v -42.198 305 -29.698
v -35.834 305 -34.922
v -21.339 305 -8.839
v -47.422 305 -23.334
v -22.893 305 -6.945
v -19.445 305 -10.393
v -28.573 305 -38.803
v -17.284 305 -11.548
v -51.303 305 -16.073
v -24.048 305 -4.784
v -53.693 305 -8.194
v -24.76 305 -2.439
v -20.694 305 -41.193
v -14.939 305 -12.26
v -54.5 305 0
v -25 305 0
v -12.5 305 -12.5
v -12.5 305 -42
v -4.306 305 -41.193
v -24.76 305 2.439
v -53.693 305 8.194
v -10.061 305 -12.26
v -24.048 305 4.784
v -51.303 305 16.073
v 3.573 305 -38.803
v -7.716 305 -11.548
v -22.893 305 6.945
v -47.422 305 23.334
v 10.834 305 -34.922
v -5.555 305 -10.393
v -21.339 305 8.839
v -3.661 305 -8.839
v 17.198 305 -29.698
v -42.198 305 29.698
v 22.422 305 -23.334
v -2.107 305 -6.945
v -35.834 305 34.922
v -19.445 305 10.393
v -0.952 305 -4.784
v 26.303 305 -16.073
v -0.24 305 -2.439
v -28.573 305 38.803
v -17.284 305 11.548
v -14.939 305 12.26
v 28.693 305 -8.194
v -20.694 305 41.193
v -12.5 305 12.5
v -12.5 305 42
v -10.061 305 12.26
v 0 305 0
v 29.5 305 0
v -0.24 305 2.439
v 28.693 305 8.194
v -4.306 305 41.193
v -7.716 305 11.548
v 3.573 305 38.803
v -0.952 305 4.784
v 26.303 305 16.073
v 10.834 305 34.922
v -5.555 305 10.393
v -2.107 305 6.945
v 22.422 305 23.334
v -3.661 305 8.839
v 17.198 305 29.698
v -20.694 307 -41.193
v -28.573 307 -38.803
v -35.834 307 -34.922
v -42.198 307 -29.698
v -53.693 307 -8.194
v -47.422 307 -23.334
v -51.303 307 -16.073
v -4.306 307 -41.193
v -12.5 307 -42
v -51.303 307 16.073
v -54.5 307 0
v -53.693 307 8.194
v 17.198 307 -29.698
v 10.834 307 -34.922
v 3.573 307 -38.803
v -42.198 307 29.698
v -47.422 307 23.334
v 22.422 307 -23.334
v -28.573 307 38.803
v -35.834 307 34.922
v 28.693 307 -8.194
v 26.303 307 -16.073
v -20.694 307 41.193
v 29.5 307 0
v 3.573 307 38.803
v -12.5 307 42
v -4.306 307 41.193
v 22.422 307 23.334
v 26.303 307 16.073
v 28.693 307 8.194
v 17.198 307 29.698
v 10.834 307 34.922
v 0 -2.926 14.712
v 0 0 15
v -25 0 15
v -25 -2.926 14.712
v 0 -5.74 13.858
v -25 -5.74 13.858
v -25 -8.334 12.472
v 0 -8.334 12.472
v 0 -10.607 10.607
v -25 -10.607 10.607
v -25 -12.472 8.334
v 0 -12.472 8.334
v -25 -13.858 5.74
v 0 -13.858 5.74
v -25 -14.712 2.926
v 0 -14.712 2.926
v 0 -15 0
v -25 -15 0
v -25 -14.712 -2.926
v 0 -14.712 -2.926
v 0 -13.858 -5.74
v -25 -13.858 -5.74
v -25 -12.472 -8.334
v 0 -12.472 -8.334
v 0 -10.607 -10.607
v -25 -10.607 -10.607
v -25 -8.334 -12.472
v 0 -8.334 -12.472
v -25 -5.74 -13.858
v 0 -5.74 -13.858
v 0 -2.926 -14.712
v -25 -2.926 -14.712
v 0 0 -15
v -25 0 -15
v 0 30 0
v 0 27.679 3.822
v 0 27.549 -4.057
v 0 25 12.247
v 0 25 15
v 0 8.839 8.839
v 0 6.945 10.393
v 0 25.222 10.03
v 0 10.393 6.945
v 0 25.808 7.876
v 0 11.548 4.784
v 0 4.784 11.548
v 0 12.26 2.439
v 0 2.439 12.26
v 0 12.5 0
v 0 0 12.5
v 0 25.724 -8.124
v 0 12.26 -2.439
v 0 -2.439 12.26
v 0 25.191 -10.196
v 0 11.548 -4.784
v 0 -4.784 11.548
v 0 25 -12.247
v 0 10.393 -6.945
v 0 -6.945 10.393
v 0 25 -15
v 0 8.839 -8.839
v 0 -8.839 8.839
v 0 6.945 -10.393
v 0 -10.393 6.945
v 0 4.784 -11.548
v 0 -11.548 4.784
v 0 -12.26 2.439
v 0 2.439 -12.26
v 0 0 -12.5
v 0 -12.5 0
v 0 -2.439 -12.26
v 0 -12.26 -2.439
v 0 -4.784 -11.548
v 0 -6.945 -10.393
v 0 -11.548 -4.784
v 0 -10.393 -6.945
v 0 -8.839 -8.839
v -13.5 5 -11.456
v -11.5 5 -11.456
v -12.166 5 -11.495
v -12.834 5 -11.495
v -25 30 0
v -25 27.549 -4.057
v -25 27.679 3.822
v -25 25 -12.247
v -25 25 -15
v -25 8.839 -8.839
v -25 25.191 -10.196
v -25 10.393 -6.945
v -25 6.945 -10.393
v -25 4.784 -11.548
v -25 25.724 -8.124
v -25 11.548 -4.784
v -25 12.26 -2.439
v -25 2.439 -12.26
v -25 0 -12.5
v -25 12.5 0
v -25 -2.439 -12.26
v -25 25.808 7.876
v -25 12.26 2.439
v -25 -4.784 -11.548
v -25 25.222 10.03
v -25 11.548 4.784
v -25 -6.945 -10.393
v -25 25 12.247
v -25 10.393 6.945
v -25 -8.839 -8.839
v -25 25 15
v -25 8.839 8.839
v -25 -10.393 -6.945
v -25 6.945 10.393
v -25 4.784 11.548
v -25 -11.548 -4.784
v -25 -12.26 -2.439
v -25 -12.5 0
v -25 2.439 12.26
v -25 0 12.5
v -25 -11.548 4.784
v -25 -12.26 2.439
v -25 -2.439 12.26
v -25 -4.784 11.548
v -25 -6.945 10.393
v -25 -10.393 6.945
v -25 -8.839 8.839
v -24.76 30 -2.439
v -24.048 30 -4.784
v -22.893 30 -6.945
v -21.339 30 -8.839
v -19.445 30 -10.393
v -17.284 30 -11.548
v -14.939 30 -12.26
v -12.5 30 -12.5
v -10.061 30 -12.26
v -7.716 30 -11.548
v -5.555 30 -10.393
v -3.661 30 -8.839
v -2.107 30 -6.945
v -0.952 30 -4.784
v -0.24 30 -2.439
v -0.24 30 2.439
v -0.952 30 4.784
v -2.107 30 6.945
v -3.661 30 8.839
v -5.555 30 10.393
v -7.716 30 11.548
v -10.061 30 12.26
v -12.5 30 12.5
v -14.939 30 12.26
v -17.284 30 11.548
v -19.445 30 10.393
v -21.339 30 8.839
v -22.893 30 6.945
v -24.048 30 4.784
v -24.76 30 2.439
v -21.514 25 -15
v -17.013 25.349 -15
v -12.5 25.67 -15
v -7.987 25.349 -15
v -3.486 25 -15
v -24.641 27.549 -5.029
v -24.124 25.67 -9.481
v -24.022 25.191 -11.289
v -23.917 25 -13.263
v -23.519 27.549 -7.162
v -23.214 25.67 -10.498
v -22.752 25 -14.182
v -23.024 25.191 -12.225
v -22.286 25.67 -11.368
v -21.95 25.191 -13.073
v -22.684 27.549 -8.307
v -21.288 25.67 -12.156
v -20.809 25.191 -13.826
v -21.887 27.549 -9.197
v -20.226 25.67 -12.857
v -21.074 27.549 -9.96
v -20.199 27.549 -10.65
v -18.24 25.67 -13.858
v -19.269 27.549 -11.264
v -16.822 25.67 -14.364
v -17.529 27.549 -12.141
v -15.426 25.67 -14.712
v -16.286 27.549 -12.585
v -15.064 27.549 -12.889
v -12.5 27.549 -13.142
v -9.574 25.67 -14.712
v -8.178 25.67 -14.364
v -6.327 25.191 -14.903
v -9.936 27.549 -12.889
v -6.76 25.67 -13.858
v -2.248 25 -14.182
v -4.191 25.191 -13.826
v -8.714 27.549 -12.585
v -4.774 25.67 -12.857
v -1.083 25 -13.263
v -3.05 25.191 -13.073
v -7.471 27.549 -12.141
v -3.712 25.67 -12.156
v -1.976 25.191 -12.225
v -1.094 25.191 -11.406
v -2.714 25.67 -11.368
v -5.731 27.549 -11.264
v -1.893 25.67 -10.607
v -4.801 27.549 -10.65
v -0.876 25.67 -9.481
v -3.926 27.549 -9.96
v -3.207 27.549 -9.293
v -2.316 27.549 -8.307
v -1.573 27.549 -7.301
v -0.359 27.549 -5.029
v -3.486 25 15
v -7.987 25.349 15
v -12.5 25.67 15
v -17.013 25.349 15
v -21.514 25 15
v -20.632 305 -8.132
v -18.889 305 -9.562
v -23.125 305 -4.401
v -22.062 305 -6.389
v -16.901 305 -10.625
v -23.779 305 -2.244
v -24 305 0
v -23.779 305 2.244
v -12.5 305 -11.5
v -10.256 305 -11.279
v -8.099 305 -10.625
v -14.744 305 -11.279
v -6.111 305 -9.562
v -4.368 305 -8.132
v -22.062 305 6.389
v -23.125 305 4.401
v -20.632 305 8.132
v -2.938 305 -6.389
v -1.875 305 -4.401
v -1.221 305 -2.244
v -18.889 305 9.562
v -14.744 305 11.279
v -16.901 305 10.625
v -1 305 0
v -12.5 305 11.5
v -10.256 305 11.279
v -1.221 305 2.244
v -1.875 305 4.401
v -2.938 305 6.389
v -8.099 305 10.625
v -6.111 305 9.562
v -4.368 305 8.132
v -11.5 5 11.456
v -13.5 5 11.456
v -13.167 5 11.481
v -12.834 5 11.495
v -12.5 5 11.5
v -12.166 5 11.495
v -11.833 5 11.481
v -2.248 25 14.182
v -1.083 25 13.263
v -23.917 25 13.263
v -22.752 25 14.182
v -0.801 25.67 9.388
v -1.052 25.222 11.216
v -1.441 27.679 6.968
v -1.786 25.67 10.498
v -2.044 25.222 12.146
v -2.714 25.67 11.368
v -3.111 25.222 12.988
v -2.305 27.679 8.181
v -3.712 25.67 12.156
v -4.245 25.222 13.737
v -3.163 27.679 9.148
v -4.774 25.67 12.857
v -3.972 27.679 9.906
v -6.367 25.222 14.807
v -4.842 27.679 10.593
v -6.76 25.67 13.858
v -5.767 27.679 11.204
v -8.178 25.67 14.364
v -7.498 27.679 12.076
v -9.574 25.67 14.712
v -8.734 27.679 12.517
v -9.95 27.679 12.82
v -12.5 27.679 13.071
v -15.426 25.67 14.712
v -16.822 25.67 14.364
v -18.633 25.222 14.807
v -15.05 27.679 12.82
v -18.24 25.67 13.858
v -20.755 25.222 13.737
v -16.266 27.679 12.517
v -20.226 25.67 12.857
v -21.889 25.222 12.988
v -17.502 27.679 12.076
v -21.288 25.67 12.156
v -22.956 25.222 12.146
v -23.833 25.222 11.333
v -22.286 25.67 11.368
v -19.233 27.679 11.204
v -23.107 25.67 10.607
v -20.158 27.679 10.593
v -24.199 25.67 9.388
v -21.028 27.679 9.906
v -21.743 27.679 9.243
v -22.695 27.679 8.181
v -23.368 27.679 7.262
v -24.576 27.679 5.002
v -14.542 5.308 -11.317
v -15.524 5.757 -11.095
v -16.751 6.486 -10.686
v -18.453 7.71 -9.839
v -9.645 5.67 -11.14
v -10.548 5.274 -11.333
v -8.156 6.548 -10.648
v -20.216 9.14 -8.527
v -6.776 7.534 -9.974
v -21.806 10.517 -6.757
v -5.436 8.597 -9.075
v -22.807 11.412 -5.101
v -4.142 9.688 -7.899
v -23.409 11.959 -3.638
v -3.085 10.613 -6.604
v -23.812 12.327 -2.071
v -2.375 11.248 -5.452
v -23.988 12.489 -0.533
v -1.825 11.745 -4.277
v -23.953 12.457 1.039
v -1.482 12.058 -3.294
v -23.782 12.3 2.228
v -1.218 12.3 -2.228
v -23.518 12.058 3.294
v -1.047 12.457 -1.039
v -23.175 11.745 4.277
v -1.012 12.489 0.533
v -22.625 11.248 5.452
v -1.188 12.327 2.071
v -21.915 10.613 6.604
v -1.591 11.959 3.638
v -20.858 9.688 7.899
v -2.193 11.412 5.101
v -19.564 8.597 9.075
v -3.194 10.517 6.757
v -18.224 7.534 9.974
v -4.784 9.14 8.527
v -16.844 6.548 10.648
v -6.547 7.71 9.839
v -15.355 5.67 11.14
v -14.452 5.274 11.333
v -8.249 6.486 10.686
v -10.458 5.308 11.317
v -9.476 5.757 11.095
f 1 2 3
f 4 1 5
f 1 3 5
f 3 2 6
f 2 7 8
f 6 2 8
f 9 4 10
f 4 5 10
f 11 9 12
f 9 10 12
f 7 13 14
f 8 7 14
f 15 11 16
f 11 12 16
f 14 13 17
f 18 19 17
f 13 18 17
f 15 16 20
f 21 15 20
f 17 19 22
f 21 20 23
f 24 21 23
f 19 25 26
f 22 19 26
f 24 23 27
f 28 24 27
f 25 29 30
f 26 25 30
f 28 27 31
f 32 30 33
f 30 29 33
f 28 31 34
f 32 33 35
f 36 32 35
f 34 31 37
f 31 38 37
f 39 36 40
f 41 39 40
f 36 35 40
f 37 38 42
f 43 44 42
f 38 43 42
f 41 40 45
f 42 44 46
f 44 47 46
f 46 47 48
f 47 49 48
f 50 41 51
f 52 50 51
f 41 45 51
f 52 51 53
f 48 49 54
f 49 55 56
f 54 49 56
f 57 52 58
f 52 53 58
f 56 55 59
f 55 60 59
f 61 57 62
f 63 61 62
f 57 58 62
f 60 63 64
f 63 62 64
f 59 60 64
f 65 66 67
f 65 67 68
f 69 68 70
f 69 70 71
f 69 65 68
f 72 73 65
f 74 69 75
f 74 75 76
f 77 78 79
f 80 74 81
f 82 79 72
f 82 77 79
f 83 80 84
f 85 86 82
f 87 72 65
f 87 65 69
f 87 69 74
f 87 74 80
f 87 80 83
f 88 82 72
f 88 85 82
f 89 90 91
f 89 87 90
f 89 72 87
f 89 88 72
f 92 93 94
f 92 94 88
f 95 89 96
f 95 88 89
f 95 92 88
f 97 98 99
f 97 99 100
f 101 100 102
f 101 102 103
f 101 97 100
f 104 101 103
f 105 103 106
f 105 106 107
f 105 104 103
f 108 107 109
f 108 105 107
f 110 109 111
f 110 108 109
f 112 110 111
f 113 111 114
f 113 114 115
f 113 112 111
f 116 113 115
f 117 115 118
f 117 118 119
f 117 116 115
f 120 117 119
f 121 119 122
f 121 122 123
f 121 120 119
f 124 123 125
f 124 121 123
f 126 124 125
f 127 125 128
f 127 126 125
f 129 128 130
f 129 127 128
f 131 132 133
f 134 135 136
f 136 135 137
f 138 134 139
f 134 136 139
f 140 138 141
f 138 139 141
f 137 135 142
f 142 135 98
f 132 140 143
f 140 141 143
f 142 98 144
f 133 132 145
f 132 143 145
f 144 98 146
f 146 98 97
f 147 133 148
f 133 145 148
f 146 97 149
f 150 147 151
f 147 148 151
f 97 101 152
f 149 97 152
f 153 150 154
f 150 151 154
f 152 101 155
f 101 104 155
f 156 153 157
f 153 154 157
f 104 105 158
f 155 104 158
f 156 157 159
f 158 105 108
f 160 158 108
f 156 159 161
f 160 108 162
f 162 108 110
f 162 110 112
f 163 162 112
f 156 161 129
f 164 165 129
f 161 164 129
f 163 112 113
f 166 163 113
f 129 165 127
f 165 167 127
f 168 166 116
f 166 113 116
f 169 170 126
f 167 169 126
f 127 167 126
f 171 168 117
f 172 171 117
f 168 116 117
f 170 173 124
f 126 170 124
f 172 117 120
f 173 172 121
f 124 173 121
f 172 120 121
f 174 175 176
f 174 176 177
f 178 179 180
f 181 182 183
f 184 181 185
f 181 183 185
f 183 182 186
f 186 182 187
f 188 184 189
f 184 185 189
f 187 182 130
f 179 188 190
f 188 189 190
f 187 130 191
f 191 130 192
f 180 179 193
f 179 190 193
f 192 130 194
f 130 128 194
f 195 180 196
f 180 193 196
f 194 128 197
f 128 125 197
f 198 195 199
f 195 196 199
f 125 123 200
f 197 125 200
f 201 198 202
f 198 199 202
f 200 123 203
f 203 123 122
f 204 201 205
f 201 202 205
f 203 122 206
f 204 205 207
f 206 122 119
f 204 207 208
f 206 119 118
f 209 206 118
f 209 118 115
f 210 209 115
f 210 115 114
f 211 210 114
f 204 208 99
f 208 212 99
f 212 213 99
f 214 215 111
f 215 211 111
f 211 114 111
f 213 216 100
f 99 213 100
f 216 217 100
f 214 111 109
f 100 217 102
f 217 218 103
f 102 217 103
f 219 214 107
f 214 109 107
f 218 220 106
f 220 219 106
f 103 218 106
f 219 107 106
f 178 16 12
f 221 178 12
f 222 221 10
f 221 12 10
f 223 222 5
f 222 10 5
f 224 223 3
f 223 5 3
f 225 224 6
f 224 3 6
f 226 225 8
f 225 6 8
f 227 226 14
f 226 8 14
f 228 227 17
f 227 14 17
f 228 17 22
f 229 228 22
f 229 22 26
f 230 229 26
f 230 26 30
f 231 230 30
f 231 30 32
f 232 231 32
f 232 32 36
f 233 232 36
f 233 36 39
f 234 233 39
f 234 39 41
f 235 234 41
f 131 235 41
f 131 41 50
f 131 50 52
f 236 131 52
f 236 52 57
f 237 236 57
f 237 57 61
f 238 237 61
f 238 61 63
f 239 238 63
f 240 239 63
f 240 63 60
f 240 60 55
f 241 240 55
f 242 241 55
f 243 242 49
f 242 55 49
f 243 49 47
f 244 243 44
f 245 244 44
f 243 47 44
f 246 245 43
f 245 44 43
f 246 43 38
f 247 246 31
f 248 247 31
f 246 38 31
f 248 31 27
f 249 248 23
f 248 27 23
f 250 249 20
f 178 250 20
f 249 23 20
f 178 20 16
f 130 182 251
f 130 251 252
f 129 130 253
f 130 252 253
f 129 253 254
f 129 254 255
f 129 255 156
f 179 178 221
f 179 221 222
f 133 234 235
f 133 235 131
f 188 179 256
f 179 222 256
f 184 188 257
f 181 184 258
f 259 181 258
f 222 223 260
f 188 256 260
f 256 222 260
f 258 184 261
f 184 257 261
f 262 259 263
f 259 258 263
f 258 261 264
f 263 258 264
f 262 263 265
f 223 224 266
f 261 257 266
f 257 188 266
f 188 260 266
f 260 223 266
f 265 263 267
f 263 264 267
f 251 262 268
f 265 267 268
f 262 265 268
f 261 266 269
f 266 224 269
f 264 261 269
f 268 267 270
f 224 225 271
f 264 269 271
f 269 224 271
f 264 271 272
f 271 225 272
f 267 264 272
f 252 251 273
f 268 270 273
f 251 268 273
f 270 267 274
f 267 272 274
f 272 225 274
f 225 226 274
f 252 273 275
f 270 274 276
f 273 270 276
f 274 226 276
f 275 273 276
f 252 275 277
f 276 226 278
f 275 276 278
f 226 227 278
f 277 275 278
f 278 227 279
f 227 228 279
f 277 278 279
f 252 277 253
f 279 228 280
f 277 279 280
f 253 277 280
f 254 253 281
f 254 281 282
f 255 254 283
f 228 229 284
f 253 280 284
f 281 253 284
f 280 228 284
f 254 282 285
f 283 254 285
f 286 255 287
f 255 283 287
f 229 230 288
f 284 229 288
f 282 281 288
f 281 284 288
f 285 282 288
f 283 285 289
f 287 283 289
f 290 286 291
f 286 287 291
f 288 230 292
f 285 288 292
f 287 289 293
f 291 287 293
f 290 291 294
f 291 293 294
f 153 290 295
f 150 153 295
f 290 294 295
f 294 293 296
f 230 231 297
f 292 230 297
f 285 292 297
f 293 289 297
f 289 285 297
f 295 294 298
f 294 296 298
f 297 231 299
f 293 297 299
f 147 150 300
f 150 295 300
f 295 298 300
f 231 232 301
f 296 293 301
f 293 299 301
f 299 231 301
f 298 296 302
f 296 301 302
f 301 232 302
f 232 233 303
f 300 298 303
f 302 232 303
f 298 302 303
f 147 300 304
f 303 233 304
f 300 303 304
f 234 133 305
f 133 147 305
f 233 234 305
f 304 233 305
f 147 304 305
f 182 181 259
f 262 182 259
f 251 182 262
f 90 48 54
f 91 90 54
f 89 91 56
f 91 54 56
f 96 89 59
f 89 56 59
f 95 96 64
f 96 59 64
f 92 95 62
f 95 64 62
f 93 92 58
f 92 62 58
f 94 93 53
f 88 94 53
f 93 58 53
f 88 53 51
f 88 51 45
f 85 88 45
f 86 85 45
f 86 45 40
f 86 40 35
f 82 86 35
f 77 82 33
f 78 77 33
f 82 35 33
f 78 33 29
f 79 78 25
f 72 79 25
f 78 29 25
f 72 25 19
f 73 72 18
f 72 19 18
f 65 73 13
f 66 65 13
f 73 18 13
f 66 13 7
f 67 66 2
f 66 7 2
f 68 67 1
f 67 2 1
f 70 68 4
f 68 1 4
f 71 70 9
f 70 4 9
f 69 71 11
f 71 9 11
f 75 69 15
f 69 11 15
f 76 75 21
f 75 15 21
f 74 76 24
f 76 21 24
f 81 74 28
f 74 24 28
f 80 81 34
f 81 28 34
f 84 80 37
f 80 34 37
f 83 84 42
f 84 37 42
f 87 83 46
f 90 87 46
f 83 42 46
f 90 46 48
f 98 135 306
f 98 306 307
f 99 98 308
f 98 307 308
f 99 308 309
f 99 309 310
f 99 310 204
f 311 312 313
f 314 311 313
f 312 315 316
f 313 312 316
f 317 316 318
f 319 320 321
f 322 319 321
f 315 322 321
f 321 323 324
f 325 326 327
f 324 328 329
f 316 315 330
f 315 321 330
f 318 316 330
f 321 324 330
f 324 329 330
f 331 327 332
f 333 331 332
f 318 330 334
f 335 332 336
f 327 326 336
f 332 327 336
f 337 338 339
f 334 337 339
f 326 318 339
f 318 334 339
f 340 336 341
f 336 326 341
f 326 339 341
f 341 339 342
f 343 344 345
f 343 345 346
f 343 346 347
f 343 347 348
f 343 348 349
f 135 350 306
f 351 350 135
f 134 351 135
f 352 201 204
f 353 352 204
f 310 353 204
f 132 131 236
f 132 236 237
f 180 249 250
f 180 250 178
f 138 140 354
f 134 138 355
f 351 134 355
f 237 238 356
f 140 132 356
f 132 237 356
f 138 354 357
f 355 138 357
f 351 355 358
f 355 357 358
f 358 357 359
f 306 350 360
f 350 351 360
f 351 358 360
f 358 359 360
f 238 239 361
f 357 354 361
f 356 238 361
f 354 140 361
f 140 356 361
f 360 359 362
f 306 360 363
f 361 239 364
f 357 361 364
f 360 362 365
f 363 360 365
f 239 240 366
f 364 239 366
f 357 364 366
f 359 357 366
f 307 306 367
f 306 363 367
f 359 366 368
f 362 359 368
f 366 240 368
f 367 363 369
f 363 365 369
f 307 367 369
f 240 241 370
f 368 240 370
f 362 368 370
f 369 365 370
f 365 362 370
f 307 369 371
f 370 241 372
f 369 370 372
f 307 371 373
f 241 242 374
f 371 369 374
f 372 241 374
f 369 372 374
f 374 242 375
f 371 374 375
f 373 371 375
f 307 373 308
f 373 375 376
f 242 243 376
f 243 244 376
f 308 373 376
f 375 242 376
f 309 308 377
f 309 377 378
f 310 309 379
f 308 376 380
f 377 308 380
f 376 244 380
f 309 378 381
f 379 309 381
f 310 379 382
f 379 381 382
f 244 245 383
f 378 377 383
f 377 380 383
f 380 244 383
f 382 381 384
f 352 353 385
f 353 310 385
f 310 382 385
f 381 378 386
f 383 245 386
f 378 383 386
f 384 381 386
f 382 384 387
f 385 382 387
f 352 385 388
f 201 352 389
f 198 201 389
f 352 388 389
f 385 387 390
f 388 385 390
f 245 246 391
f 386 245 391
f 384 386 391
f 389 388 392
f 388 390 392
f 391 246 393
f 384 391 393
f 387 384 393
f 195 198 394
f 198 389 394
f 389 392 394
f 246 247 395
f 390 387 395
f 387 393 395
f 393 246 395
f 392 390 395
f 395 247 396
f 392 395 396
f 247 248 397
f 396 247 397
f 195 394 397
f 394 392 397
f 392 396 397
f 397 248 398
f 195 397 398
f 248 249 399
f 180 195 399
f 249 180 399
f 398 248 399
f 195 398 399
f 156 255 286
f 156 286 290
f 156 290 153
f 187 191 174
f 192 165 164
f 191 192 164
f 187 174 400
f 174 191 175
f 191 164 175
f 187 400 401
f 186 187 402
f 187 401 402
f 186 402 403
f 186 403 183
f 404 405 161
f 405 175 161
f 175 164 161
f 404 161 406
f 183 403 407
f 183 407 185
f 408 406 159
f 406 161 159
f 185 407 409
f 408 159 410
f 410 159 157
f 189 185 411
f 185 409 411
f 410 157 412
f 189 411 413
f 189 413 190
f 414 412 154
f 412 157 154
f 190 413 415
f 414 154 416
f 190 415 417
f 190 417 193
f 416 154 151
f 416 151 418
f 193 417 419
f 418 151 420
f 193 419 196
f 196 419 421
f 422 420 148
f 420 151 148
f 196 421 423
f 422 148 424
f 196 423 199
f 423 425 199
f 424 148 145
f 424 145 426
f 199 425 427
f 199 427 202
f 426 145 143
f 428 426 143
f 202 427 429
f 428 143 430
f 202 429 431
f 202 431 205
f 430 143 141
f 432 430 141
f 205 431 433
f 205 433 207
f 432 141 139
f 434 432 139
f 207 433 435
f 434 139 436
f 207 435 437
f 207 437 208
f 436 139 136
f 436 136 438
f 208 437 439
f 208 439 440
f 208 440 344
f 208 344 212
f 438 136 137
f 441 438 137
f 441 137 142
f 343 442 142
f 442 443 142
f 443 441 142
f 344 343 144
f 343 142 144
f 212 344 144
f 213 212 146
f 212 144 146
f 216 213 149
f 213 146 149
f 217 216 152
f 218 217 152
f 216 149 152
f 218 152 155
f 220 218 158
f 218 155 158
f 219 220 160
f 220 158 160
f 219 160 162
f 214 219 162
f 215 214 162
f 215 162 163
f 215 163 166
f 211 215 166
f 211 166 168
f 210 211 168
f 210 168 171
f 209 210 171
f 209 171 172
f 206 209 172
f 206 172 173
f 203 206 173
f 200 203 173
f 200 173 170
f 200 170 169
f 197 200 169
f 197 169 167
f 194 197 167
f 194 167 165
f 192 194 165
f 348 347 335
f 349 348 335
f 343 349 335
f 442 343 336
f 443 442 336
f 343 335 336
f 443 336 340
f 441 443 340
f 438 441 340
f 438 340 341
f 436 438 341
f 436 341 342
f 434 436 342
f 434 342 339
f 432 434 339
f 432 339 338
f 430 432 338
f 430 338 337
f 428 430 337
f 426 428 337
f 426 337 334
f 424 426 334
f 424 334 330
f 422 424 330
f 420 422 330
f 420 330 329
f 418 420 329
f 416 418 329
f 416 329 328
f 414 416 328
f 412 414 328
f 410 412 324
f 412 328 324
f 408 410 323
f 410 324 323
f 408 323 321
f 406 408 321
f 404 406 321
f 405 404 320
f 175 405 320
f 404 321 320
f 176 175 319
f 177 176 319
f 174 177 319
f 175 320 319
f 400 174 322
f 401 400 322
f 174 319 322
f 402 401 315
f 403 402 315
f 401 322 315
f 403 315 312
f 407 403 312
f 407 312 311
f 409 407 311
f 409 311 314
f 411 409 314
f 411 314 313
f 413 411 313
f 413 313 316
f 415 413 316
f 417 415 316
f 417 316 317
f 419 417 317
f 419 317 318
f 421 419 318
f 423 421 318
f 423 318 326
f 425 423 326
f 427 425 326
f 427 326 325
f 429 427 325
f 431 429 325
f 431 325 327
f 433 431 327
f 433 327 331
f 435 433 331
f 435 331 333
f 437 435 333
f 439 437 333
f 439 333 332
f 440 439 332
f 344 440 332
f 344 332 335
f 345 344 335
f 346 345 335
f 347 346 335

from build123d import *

# Parameters (mm, degrees)
SKETCH1_R           = 15
SKETCH1_R_2         = 12.5
BOSS_EXTRUDE1_DEPTH = 25
CUT_EXTRUDE1_DEPTH  = 280
FILLET1_R           = 5
FILLET2_R           = 5
SKETCH3_R           = 11.5
CUT_EXTRUDE2_DEPTH  = 300
SKETCH4_R           = 42
BOSS_EXTRUDE2_DEPTH = 2


with BuildPart() as part:
    # Sketch1 → Boss-Extrude1 (new body)
    # profile 1 of 2: a face of its own
    with BuildSketch(Plane(origin=(0, 0, 0), x_dir=(0, 0, -1), z_dir=(1, 0, 0))):
        with BuildLine():
            ThreePointArc((-15, 0), (0, 15), (15, 0))
            Line((15, 0), (15, 305))
            Line((15, 305), (-15, 305))
            Line((-15, 305), (-15, 0))
        make_face()
    # profile 2 of 2: a face of its own
    with BuildSketch(Plane(origin=(0, 0, 0), x_dir=(0, 0, -1), z_dir=(1, 0, 0))):
        Circle(SKETCH1_R)
        Circle(SKETCH1_R_2, mode=Mode.SUBTRACT)
    extrude(amount=-BOSS_EXTRUDE1_DEPTH)

    # Sketch2 → Cut-Extrude1 (cut)
    with BuildSketch(Plane(origin=(0, 305, 0), x_dir=(1, 0, 0), z_dir=(0, 1, 0))):
        with BuildLine():
            Line((0, -15), (0, 0))
            ThreePointArc((0, 0), (-12.5, -12.5), (-25, 0))
            Line((-25, 0), (-25, -15))
            Line((-25, -15), (0, -15))
        make_face()
        with BuildLine():
            ThreePointArc((-25, 0), (-12.5, 12.5), (0, 0))
            Line((0, 0), (0, 15))
            Line((0, 15), (-25, 15))
            Line((-25, 15), (-25, 0))
        make_face()
    extrude(amount=-CUT_EXTRUDE1_DEPTH, mode=Mode.SUBTRACT)

    # Fillet1
    # the kernel refuses this fillet: 5 mm, written as the material it adds along each edge
    with BuildSketch(Plane(origin=(-12.5, 25, 0), x_dir=(1, 0, 0), z_dir=(0, 0, -1))) as fillet1_piece_1_section:
        with BuildLine():
            CenterArc((12.5 + FILLET1_R, -FILLET1_R), FILLET1_R, 90, 90)
            Line((12.5, -FILLET1_R), (12.5, 0))
            Line((12.5, 0), (12.5 + FILLET1_R, 0))
        make_face()
    fillet1_piece_1 = revolve(axis=Axis((-12.5, 25, 0), (0, -1, 0)), revolution_arc=180, mode=Mode.PRIVATE)
    fillet1_piece_1 = split(fillet1_piece_1, bisect_by=Plane(origin=(-12.5, 26.425263387, 15), z_dir=(0, 0, -1)), keep=Keep.TOP, mode=Mode.PRIVATE)
    fillet1_piece_1 = split(fillet1_piece_1, bisect_by=Plane(origin=(-25, 26.425263387, 13.925263387), z_dir=(1, 0, 0)), keep=Keep.TOP, mode=Mode.PRIVATE)
    fillet1_piece_1 = split(fillet1_piece_1, bisect_by=Plane(origin=(0, 26.425263387, 13.925263387), z_dir=(-1, 0, 0)), keep=Keep.TOP, mode=Mode.PRIVATE)
    add(fillet1_piece_1)

    # Fillet2
    # the kernel refuses this fillet: 5 mm, written as the material it adds along each edge
    with BuildSketch(Plane(origin=(-12.5, 25, 0), x_dir=(-0.5389483633149527, 0, 0.8423388045674577), z_dir=(0.8423388045674577, 0, 0.5389483633149527))) as fillet2_piece_1_section:
        with BuildLine():
            CenterArc((12.5 + FILLET2_R, -FILLET2_R), FILLET2_R, 90, 90)
            Line((12.5 + FILLET2_R, 0), (12.5, 0))
            Line((12.5, 0), (12.5, -FILLET2_R))
        make_face()
    fillet2_piece_1 = revolve(axis=Axis((-12.5, 25, 0), (0, -1, 0)), revolution_arc=294.775843921, mode=Mode.PRIVATE)
    fillet2_piece_1 = split(fillet2_piece_1, bisect_by=Plane(origin=(-25, 27.5000003, -12.555440979), z_dir=(1, 0, 0)), keep=Keep.TOP, mode=Mode.PRIVATE)
    fillet2_piece_1 = split(fillet2_piece_1, bisect_by=Plane(origin=(0, 27.5000003, -12.555440979), z_dir=(-1, 0, 0)), keep=Keep.TOP, mode=Mode.PRIVATE)
    fillet2_piece_1 = split(fillet2_piece_1, bisect_by=Plane(origin=(-12.5, 27.5000003, -15), z_dir=(0, 0, 1)), keep=Keep.TOP, mode=Mode.PRIVATE)
    add(fillet2_piece_1)

    # Sketch3 → Cut-Extrude2 (cut)
    with BuildSketch(Plane(origin=(0, 305, 0), x_dir=(1, 0, 0), z_dir=(0, 1, 0))):
        with Locations(Location((-12.5, 0, 0), (0, 0, 270))):
            Circle(SKETCH3_R)
    extrude(amount=-CUT_EXTRUDE2_DEPTH, mode=Mode.SUBTRACT)

    # Sketch4 → Boss-Extrude2 (add)
    with BuildSketch(Plane(origin=(0, 305, 0), x_dir=(1, 0, 0), z_dir=(0, 1, 0))):
        with Locations(Location((-12.5, 0, 0), (0, 0, 270))):
            Circle(SKETCH4_R)
    extrude(amount=BOSS_EXTRUDE2_DEPTH)


solid = part.part
